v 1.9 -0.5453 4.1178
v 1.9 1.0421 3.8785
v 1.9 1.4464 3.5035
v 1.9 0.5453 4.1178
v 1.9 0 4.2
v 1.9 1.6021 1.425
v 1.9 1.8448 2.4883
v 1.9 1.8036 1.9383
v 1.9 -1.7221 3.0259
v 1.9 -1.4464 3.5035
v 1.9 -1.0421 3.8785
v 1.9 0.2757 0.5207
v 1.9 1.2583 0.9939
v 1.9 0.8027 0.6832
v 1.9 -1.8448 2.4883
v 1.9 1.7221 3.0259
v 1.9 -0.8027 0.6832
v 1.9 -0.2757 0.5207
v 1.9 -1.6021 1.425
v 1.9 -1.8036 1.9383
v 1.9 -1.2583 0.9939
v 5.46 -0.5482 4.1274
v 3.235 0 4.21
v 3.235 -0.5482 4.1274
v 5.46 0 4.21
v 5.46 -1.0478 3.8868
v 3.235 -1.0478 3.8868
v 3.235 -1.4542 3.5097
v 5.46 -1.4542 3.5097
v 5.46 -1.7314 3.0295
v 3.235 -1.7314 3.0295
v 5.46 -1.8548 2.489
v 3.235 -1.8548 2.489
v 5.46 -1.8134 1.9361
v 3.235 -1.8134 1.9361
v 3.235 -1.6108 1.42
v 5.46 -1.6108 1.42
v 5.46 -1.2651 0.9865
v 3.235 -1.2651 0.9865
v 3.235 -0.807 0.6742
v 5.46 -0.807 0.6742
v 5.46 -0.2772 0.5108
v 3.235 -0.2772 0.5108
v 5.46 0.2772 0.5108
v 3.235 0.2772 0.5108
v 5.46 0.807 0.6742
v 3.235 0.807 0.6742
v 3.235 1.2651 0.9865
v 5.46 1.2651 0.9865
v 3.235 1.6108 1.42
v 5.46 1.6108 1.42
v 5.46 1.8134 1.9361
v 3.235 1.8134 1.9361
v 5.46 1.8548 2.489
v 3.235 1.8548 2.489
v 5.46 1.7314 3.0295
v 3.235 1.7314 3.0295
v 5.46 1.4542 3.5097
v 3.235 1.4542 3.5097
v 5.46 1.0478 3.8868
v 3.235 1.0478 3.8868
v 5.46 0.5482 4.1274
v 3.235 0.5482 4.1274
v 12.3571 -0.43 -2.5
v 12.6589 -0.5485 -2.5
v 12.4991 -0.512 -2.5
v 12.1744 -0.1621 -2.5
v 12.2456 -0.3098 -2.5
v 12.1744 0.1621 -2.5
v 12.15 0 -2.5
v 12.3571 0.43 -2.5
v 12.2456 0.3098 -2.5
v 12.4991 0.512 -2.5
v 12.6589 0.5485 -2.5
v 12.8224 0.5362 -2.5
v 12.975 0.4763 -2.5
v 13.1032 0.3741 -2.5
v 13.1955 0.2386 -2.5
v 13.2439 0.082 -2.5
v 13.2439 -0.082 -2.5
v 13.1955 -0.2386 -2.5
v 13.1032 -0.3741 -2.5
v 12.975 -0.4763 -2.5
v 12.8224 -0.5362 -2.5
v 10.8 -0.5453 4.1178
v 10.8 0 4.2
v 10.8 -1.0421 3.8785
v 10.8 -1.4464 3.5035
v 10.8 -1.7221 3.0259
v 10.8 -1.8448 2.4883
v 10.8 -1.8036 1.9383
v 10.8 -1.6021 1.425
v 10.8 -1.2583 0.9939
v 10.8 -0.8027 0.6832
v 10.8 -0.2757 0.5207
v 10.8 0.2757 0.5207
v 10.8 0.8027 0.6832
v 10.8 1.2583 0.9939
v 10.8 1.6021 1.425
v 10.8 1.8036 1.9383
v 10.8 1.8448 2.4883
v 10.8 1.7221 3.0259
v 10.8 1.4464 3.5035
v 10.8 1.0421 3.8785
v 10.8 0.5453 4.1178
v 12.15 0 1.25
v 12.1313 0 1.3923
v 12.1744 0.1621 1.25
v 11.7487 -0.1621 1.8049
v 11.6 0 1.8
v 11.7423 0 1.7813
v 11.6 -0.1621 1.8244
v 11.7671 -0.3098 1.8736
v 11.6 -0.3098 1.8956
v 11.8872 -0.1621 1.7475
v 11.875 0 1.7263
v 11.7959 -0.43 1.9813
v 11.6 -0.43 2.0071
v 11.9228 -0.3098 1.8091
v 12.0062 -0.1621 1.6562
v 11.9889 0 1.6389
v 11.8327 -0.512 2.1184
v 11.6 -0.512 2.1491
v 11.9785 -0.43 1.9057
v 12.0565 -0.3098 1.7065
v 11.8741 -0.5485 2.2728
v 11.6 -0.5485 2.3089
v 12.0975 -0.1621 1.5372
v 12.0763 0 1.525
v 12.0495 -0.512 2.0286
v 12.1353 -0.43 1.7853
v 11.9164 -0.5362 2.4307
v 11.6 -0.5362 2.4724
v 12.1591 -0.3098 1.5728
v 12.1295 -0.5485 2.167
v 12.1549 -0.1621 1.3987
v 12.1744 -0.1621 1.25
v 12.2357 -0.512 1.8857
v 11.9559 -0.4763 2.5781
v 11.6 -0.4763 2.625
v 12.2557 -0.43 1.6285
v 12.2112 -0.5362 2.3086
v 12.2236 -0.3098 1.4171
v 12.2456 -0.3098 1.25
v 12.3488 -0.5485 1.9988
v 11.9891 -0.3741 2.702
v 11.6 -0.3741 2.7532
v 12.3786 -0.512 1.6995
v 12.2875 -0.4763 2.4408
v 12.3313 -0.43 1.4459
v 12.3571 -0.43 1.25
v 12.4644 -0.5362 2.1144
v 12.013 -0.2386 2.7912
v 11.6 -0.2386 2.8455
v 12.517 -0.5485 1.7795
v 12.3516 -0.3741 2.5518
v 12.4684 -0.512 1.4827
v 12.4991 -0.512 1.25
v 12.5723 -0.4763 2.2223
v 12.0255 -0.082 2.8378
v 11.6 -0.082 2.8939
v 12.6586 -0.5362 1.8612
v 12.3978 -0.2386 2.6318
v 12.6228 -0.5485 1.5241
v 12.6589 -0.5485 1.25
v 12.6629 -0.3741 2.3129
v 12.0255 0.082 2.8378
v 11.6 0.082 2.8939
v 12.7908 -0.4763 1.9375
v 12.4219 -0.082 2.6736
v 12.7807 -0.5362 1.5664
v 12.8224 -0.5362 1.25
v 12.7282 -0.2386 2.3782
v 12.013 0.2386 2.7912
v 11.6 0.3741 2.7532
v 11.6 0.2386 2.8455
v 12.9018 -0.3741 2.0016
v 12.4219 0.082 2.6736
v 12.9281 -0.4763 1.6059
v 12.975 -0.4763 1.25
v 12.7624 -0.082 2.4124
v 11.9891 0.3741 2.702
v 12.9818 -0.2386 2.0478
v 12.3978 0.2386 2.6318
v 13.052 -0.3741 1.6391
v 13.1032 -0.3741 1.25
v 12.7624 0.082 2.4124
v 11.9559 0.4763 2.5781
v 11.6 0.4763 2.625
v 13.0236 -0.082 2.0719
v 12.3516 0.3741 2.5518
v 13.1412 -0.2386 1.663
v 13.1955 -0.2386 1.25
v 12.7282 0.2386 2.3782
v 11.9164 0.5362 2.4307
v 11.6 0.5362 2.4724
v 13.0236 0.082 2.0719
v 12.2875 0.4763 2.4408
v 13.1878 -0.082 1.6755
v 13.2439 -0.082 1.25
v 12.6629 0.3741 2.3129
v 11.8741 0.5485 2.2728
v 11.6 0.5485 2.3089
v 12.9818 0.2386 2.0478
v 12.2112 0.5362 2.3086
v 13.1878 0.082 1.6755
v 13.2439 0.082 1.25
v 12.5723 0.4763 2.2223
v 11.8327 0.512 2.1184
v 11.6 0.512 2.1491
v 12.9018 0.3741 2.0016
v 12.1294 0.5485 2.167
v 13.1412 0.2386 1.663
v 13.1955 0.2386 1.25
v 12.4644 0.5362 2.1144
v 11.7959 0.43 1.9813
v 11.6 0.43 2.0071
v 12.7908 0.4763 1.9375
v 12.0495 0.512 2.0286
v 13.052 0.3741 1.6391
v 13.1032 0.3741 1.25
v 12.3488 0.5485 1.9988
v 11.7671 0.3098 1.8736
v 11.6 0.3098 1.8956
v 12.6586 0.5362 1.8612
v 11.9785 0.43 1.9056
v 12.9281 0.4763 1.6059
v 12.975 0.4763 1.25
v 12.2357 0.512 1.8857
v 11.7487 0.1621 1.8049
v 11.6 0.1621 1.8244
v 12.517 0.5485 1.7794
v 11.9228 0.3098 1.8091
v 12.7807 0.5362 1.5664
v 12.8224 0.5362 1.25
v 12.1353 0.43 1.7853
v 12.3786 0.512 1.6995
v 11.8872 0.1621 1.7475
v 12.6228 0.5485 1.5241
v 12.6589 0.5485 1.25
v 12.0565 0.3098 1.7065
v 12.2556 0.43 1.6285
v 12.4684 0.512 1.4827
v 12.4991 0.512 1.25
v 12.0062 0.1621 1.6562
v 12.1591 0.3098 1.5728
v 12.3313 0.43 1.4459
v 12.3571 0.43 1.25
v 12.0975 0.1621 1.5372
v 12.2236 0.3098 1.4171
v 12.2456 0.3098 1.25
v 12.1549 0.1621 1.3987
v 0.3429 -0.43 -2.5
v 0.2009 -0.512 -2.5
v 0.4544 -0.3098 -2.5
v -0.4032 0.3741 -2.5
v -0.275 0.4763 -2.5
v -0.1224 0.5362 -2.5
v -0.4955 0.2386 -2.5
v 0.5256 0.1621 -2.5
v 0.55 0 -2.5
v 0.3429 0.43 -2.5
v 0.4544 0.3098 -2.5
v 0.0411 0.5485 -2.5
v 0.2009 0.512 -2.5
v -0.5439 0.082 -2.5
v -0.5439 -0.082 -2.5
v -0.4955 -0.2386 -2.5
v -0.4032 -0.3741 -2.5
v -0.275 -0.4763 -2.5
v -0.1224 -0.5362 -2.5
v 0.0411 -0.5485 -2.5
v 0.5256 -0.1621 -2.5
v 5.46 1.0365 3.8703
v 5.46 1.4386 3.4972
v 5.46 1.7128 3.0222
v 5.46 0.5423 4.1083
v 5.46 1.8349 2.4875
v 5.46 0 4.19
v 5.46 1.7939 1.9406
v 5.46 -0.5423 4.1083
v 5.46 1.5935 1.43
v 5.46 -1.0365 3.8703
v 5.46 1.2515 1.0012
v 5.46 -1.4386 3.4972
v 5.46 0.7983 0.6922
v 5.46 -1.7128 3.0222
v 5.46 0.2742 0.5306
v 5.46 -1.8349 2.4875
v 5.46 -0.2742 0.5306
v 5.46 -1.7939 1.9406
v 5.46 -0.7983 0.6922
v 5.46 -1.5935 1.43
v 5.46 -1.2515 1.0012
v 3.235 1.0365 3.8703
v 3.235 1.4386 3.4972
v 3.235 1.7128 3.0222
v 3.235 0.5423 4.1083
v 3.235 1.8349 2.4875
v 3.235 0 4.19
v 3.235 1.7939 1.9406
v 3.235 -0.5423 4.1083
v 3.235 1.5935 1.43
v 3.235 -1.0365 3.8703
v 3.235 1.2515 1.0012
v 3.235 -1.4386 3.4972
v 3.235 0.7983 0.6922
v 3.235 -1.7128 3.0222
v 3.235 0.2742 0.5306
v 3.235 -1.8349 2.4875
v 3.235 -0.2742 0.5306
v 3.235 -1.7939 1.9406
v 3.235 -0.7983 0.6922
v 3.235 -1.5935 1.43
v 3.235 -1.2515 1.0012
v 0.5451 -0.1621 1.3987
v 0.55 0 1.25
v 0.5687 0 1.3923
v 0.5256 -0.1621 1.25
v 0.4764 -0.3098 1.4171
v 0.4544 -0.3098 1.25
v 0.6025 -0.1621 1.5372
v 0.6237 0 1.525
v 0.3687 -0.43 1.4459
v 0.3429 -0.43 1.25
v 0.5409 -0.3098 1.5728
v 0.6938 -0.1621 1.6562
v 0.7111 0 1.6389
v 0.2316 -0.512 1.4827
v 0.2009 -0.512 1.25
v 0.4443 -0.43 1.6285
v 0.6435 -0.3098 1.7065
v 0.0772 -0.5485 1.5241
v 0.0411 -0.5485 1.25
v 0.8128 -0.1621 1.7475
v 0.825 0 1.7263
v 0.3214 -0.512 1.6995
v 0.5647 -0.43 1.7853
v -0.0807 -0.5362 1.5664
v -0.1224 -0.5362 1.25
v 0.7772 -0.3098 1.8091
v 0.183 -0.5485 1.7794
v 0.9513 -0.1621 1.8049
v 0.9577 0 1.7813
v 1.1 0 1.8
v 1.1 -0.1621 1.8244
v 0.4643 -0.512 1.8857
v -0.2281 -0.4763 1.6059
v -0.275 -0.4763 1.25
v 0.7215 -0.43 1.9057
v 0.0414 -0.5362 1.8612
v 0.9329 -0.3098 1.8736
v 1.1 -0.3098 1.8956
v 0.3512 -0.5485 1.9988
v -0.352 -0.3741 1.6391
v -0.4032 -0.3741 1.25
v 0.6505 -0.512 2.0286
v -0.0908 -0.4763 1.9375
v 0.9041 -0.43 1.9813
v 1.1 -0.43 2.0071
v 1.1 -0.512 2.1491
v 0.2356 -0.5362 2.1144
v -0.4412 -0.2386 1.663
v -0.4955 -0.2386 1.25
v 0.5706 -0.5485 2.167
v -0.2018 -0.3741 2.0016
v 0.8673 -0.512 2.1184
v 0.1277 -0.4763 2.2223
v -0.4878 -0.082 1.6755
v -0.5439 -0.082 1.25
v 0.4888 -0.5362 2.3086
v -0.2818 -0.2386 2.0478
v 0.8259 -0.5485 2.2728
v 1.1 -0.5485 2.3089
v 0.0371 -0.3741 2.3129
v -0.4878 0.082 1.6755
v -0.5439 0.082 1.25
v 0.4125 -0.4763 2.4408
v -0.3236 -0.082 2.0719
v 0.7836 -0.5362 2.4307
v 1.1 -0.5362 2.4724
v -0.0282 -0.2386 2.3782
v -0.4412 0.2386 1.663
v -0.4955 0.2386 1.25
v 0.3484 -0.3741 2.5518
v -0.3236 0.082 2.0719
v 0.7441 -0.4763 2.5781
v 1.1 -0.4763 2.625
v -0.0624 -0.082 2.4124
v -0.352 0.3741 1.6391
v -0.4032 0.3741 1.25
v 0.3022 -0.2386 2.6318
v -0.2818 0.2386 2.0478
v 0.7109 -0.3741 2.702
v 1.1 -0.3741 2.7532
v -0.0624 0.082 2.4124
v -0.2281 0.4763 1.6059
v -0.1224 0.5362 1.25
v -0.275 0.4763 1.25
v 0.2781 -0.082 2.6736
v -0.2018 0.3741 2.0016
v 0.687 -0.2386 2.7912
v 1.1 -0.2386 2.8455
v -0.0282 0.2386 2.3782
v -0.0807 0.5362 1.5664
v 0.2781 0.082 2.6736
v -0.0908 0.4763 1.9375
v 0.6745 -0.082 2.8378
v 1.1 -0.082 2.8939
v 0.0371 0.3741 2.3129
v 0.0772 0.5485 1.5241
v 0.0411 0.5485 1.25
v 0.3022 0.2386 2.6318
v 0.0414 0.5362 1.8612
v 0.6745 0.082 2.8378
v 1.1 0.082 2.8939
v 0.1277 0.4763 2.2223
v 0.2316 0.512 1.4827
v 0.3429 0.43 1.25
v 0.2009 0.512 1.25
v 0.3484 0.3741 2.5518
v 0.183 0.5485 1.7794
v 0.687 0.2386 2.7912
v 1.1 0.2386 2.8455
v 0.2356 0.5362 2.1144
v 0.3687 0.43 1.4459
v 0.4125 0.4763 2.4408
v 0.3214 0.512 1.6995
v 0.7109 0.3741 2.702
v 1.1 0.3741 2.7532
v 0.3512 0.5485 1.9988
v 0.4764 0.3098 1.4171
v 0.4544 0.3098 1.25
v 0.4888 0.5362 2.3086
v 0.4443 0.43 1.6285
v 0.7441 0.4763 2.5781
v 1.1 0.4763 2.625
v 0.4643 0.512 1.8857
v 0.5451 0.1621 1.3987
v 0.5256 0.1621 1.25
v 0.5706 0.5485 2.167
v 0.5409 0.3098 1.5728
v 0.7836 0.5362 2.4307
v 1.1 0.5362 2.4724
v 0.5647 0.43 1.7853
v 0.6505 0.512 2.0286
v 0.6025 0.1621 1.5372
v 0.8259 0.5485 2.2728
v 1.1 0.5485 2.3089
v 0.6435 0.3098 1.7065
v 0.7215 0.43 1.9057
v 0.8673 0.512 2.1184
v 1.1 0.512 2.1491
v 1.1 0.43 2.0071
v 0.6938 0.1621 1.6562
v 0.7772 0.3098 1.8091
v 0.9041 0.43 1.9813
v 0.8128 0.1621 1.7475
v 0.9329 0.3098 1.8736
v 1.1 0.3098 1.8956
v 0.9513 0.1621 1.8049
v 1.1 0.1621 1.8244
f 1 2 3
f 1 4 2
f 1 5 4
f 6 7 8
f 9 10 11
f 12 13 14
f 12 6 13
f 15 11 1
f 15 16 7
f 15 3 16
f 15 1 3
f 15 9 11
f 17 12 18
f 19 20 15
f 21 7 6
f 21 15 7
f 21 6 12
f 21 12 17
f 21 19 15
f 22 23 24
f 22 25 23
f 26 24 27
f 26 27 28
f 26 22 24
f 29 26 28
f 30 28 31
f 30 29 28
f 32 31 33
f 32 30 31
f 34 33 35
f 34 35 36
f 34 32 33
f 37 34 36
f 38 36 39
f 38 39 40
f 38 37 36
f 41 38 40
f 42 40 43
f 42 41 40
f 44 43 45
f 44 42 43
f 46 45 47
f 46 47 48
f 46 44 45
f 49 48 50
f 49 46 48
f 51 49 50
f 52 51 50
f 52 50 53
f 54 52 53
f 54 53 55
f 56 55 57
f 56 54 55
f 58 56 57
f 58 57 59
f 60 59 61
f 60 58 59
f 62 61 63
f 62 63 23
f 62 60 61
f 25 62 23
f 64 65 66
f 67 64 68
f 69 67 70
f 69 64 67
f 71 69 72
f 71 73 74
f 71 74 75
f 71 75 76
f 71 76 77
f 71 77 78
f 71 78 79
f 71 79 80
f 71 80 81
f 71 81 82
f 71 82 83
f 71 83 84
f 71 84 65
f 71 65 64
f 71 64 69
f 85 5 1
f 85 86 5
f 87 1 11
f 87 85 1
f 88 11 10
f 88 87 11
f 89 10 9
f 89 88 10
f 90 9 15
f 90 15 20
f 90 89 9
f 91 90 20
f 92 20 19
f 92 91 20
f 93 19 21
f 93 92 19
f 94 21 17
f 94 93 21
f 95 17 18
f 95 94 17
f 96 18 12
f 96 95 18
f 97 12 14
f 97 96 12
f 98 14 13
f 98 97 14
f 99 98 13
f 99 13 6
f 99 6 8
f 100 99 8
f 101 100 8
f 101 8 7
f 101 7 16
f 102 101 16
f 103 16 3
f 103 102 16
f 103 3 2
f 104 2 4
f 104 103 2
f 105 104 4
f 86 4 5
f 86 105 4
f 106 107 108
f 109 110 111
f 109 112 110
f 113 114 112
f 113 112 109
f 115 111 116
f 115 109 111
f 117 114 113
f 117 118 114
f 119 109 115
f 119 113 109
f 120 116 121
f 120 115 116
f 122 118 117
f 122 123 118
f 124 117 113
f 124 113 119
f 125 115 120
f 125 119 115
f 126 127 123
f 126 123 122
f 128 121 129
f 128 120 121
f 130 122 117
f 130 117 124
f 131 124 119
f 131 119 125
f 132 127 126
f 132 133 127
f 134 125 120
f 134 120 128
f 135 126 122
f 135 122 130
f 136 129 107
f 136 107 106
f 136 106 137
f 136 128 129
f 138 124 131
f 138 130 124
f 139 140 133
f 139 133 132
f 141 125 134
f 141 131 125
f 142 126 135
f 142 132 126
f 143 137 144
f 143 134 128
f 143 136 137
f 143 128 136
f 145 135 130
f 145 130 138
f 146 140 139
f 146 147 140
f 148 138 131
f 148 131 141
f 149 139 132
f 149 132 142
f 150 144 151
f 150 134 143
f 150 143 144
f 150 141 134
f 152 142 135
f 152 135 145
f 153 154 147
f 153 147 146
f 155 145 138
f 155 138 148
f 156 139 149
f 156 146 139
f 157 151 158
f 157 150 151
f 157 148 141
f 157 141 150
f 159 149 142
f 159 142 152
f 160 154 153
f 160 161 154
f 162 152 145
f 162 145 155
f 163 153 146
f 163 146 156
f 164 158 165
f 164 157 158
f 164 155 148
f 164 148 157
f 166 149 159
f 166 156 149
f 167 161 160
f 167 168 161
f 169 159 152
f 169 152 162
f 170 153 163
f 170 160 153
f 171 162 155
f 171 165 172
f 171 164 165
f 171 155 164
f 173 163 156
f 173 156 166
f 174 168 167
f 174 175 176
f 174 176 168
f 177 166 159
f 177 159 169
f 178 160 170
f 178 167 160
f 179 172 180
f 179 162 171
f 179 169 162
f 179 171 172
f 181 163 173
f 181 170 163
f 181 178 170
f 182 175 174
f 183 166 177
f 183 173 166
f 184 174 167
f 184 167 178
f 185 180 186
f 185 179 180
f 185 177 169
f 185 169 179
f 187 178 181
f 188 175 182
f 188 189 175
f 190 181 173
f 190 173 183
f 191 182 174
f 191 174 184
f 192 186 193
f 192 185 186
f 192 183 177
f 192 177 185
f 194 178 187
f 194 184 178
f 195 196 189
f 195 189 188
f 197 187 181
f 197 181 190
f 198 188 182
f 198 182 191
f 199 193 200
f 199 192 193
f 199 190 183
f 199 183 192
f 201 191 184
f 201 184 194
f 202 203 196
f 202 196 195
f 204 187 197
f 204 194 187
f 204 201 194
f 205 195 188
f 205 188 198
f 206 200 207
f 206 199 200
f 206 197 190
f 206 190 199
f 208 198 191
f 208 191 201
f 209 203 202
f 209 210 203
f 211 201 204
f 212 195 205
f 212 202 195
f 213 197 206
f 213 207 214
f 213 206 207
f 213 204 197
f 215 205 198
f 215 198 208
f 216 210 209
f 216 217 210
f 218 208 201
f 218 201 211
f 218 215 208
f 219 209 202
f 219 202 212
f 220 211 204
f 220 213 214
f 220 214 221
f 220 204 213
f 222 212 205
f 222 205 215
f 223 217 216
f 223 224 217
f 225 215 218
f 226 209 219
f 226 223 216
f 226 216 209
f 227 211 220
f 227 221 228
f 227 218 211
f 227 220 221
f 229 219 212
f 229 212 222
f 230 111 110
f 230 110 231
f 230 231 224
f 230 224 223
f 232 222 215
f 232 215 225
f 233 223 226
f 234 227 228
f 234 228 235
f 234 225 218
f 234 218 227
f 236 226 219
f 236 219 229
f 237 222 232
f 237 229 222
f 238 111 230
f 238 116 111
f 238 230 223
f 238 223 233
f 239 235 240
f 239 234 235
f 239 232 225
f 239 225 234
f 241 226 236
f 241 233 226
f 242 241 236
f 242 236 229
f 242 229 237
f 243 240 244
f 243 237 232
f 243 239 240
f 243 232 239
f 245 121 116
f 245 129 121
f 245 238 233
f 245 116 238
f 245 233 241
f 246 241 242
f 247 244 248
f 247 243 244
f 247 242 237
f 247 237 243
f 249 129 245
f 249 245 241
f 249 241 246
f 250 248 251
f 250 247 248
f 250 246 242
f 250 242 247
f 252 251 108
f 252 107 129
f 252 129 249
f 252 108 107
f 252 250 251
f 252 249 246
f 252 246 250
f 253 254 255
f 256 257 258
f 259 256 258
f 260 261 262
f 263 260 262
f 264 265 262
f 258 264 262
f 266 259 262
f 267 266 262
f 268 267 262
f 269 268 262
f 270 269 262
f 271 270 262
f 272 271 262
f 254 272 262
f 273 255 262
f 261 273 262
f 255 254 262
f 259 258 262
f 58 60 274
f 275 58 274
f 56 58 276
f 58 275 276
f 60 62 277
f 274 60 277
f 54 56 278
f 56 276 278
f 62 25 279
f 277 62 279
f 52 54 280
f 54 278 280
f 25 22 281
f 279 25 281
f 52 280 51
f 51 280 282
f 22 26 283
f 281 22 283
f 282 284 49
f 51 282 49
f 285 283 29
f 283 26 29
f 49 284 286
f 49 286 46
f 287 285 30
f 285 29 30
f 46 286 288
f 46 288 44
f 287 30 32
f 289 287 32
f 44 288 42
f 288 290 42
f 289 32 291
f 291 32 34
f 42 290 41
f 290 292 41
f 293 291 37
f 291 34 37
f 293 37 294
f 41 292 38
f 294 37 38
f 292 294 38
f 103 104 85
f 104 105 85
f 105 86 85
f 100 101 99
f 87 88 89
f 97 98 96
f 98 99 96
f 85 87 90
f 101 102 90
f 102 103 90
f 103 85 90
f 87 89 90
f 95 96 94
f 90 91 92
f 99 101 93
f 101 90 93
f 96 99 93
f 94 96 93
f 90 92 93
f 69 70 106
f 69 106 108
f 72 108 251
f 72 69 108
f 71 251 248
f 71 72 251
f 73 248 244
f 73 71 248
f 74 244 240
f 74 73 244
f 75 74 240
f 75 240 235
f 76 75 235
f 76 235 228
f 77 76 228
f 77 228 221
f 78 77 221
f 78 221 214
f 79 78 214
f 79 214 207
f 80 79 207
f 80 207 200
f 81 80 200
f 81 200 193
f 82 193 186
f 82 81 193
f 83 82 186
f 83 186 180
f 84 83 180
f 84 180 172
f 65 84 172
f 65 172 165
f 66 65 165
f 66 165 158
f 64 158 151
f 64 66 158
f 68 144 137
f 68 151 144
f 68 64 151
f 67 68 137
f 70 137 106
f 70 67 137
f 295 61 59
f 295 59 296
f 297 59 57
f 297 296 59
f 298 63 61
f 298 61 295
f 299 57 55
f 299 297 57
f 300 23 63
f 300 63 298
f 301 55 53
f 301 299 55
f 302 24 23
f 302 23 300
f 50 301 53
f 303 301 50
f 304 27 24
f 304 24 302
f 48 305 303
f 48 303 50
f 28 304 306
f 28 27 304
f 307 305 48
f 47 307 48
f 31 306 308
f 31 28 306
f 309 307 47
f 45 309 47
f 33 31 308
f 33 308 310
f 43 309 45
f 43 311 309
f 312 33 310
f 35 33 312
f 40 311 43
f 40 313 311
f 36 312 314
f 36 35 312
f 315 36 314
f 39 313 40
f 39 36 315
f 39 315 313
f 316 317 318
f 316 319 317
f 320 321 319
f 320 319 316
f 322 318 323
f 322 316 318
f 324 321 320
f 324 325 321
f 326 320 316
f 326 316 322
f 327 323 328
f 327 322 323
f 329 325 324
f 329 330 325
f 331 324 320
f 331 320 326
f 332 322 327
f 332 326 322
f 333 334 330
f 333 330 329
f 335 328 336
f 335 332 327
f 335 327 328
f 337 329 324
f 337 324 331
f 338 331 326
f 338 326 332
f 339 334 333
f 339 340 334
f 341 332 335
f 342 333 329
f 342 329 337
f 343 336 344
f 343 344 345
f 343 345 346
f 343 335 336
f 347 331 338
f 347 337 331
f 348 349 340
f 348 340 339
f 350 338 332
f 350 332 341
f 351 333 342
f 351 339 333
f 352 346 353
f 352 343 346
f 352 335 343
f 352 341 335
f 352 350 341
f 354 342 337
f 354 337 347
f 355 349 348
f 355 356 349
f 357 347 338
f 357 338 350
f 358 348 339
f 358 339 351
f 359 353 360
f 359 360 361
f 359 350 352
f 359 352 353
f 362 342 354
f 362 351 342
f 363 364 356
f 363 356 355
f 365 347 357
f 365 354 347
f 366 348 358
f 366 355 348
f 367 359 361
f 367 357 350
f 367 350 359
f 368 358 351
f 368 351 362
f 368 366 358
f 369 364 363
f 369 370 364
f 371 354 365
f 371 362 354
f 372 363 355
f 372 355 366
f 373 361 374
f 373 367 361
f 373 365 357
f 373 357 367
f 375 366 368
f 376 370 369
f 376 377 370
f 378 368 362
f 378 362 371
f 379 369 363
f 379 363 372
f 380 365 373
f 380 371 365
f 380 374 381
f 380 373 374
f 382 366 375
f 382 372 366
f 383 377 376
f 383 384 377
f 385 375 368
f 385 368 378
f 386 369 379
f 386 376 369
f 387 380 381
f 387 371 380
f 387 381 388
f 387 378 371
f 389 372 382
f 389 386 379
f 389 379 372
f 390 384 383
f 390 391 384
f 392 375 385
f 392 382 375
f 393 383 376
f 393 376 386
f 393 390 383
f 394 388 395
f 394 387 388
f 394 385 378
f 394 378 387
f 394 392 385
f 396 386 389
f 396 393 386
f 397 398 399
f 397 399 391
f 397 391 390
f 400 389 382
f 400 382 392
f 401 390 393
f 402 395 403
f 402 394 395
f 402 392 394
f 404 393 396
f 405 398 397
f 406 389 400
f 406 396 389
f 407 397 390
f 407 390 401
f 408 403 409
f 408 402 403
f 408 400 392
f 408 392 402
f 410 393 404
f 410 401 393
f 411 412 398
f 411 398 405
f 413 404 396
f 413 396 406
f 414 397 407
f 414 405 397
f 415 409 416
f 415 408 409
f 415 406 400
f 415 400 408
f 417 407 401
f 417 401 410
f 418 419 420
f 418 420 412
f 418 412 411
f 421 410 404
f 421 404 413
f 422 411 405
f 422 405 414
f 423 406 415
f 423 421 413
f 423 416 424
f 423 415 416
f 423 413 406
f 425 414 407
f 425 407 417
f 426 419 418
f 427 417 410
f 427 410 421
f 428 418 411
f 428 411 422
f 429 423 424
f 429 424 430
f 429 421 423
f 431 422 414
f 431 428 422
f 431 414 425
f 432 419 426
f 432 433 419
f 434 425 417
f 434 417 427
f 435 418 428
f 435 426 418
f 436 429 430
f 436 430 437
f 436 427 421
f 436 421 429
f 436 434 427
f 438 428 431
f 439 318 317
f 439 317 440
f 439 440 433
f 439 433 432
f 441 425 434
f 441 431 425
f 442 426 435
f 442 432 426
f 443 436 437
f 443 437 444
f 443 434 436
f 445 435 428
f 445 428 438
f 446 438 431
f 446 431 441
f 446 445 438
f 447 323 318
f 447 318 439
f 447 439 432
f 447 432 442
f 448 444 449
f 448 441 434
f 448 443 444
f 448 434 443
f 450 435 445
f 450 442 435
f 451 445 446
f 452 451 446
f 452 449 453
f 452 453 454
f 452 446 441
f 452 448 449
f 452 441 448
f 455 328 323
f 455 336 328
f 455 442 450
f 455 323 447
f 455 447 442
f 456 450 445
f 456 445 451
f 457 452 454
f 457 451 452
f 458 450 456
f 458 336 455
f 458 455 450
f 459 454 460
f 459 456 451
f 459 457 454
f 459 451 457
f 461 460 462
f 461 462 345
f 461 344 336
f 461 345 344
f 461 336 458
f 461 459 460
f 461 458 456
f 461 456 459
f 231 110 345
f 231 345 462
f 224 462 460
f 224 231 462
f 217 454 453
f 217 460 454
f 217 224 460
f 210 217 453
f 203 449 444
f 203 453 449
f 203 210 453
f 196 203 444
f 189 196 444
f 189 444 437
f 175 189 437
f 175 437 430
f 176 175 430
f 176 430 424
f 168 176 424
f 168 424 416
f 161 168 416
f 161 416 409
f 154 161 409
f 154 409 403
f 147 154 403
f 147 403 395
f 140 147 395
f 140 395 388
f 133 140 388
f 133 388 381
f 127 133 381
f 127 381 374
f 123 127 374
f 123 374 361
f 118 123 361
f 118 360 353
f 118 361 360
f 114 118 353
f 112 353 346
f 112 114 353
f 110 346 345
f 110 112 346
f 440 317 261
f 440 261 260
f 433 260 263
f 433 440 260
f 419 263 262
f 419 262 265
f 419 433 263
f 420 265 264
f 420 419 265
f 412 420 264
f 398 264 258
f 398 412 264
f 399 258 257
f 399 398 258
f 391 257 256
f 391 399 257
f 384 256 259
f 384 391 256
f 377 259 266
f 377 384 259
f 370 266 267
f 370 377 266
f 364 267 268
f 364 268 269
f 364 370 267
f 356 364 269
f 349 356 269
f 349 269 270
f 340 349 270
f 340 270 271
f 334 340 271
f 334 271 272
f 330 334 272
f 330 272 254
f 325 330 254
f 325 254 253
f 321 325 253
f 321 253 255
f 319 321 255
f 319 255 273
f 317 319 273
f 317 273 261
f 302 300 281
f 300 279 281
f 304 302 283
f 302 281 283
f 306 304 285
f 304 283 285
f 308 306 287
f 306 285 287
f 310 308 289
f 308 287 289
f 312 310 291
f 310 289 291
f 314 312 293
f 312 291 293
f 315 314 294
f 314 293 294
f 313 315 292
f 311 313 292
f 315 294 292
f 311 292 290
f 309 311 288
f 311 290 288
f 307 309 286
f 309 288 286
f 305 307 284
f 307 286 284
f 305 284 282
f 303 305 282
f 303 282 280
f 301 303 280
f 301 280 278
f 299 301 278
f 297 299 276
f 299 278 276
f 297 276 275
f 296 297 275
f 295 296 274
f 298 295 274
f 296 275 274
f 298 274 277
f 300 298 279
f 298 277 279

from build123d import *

# Parameters (mm, degrees)
SKETCH002_W = 8.9
SKETCH002_H = 1.85
SKETCH003_W = 2.225
SKETCH003_H = 0.02
SKETCH_R    = 0.55


with BuildPart() as revolution:
    # Sketch002 → Revolution (revolve)
    with BuildSketch(Plane.XZ):
        with Locations((6.35, 3.275)):
            Rectangle(SKETCH002_W, SKETCH002_H)
    revolve(axis=Axis((1.9, 0, 2.35), (1, 0, 0)))


with BuildPart() as revolution001:
    # Sketch003 → Revolution001 (revolve)
    with BuildSketch(Plane.XZ):
        with Locations((4.3475, 4.2)):
            Rectangle(SKETCH003_W, SKETCH003_H)
    revolve(axis=Axis((0, 0, 2.35), (1, 0, 0)))


with BuildPart() as sweep_body:
    # Sweep: sweep along a path in Sketch001
    with BuildLine(Plane.XZ) as sweep_path:
        Line((0, -2.5), (0, 1.25))
        ThreePointArc((0, 1.25), (0.322183, 2.027817), (1.1, 2.35))
        Line((1.1, 2.35), (11.6, 2.35))
        ThreePointArc((11.6, 2.35), (12.377817, 2.027817), (12.7, 1.25))
        Line((12.7, 1.25), (12.7, -2.5))
    # Sketch → Sweep (sweep)
    with BuildSketch(Plane.XY.offset(-2)):
        Circle(SKETCH_R)
    sweep(path=sweep_path.line)


solid = Compound([revolution.part, revolution001.part, sweep_body.part])
